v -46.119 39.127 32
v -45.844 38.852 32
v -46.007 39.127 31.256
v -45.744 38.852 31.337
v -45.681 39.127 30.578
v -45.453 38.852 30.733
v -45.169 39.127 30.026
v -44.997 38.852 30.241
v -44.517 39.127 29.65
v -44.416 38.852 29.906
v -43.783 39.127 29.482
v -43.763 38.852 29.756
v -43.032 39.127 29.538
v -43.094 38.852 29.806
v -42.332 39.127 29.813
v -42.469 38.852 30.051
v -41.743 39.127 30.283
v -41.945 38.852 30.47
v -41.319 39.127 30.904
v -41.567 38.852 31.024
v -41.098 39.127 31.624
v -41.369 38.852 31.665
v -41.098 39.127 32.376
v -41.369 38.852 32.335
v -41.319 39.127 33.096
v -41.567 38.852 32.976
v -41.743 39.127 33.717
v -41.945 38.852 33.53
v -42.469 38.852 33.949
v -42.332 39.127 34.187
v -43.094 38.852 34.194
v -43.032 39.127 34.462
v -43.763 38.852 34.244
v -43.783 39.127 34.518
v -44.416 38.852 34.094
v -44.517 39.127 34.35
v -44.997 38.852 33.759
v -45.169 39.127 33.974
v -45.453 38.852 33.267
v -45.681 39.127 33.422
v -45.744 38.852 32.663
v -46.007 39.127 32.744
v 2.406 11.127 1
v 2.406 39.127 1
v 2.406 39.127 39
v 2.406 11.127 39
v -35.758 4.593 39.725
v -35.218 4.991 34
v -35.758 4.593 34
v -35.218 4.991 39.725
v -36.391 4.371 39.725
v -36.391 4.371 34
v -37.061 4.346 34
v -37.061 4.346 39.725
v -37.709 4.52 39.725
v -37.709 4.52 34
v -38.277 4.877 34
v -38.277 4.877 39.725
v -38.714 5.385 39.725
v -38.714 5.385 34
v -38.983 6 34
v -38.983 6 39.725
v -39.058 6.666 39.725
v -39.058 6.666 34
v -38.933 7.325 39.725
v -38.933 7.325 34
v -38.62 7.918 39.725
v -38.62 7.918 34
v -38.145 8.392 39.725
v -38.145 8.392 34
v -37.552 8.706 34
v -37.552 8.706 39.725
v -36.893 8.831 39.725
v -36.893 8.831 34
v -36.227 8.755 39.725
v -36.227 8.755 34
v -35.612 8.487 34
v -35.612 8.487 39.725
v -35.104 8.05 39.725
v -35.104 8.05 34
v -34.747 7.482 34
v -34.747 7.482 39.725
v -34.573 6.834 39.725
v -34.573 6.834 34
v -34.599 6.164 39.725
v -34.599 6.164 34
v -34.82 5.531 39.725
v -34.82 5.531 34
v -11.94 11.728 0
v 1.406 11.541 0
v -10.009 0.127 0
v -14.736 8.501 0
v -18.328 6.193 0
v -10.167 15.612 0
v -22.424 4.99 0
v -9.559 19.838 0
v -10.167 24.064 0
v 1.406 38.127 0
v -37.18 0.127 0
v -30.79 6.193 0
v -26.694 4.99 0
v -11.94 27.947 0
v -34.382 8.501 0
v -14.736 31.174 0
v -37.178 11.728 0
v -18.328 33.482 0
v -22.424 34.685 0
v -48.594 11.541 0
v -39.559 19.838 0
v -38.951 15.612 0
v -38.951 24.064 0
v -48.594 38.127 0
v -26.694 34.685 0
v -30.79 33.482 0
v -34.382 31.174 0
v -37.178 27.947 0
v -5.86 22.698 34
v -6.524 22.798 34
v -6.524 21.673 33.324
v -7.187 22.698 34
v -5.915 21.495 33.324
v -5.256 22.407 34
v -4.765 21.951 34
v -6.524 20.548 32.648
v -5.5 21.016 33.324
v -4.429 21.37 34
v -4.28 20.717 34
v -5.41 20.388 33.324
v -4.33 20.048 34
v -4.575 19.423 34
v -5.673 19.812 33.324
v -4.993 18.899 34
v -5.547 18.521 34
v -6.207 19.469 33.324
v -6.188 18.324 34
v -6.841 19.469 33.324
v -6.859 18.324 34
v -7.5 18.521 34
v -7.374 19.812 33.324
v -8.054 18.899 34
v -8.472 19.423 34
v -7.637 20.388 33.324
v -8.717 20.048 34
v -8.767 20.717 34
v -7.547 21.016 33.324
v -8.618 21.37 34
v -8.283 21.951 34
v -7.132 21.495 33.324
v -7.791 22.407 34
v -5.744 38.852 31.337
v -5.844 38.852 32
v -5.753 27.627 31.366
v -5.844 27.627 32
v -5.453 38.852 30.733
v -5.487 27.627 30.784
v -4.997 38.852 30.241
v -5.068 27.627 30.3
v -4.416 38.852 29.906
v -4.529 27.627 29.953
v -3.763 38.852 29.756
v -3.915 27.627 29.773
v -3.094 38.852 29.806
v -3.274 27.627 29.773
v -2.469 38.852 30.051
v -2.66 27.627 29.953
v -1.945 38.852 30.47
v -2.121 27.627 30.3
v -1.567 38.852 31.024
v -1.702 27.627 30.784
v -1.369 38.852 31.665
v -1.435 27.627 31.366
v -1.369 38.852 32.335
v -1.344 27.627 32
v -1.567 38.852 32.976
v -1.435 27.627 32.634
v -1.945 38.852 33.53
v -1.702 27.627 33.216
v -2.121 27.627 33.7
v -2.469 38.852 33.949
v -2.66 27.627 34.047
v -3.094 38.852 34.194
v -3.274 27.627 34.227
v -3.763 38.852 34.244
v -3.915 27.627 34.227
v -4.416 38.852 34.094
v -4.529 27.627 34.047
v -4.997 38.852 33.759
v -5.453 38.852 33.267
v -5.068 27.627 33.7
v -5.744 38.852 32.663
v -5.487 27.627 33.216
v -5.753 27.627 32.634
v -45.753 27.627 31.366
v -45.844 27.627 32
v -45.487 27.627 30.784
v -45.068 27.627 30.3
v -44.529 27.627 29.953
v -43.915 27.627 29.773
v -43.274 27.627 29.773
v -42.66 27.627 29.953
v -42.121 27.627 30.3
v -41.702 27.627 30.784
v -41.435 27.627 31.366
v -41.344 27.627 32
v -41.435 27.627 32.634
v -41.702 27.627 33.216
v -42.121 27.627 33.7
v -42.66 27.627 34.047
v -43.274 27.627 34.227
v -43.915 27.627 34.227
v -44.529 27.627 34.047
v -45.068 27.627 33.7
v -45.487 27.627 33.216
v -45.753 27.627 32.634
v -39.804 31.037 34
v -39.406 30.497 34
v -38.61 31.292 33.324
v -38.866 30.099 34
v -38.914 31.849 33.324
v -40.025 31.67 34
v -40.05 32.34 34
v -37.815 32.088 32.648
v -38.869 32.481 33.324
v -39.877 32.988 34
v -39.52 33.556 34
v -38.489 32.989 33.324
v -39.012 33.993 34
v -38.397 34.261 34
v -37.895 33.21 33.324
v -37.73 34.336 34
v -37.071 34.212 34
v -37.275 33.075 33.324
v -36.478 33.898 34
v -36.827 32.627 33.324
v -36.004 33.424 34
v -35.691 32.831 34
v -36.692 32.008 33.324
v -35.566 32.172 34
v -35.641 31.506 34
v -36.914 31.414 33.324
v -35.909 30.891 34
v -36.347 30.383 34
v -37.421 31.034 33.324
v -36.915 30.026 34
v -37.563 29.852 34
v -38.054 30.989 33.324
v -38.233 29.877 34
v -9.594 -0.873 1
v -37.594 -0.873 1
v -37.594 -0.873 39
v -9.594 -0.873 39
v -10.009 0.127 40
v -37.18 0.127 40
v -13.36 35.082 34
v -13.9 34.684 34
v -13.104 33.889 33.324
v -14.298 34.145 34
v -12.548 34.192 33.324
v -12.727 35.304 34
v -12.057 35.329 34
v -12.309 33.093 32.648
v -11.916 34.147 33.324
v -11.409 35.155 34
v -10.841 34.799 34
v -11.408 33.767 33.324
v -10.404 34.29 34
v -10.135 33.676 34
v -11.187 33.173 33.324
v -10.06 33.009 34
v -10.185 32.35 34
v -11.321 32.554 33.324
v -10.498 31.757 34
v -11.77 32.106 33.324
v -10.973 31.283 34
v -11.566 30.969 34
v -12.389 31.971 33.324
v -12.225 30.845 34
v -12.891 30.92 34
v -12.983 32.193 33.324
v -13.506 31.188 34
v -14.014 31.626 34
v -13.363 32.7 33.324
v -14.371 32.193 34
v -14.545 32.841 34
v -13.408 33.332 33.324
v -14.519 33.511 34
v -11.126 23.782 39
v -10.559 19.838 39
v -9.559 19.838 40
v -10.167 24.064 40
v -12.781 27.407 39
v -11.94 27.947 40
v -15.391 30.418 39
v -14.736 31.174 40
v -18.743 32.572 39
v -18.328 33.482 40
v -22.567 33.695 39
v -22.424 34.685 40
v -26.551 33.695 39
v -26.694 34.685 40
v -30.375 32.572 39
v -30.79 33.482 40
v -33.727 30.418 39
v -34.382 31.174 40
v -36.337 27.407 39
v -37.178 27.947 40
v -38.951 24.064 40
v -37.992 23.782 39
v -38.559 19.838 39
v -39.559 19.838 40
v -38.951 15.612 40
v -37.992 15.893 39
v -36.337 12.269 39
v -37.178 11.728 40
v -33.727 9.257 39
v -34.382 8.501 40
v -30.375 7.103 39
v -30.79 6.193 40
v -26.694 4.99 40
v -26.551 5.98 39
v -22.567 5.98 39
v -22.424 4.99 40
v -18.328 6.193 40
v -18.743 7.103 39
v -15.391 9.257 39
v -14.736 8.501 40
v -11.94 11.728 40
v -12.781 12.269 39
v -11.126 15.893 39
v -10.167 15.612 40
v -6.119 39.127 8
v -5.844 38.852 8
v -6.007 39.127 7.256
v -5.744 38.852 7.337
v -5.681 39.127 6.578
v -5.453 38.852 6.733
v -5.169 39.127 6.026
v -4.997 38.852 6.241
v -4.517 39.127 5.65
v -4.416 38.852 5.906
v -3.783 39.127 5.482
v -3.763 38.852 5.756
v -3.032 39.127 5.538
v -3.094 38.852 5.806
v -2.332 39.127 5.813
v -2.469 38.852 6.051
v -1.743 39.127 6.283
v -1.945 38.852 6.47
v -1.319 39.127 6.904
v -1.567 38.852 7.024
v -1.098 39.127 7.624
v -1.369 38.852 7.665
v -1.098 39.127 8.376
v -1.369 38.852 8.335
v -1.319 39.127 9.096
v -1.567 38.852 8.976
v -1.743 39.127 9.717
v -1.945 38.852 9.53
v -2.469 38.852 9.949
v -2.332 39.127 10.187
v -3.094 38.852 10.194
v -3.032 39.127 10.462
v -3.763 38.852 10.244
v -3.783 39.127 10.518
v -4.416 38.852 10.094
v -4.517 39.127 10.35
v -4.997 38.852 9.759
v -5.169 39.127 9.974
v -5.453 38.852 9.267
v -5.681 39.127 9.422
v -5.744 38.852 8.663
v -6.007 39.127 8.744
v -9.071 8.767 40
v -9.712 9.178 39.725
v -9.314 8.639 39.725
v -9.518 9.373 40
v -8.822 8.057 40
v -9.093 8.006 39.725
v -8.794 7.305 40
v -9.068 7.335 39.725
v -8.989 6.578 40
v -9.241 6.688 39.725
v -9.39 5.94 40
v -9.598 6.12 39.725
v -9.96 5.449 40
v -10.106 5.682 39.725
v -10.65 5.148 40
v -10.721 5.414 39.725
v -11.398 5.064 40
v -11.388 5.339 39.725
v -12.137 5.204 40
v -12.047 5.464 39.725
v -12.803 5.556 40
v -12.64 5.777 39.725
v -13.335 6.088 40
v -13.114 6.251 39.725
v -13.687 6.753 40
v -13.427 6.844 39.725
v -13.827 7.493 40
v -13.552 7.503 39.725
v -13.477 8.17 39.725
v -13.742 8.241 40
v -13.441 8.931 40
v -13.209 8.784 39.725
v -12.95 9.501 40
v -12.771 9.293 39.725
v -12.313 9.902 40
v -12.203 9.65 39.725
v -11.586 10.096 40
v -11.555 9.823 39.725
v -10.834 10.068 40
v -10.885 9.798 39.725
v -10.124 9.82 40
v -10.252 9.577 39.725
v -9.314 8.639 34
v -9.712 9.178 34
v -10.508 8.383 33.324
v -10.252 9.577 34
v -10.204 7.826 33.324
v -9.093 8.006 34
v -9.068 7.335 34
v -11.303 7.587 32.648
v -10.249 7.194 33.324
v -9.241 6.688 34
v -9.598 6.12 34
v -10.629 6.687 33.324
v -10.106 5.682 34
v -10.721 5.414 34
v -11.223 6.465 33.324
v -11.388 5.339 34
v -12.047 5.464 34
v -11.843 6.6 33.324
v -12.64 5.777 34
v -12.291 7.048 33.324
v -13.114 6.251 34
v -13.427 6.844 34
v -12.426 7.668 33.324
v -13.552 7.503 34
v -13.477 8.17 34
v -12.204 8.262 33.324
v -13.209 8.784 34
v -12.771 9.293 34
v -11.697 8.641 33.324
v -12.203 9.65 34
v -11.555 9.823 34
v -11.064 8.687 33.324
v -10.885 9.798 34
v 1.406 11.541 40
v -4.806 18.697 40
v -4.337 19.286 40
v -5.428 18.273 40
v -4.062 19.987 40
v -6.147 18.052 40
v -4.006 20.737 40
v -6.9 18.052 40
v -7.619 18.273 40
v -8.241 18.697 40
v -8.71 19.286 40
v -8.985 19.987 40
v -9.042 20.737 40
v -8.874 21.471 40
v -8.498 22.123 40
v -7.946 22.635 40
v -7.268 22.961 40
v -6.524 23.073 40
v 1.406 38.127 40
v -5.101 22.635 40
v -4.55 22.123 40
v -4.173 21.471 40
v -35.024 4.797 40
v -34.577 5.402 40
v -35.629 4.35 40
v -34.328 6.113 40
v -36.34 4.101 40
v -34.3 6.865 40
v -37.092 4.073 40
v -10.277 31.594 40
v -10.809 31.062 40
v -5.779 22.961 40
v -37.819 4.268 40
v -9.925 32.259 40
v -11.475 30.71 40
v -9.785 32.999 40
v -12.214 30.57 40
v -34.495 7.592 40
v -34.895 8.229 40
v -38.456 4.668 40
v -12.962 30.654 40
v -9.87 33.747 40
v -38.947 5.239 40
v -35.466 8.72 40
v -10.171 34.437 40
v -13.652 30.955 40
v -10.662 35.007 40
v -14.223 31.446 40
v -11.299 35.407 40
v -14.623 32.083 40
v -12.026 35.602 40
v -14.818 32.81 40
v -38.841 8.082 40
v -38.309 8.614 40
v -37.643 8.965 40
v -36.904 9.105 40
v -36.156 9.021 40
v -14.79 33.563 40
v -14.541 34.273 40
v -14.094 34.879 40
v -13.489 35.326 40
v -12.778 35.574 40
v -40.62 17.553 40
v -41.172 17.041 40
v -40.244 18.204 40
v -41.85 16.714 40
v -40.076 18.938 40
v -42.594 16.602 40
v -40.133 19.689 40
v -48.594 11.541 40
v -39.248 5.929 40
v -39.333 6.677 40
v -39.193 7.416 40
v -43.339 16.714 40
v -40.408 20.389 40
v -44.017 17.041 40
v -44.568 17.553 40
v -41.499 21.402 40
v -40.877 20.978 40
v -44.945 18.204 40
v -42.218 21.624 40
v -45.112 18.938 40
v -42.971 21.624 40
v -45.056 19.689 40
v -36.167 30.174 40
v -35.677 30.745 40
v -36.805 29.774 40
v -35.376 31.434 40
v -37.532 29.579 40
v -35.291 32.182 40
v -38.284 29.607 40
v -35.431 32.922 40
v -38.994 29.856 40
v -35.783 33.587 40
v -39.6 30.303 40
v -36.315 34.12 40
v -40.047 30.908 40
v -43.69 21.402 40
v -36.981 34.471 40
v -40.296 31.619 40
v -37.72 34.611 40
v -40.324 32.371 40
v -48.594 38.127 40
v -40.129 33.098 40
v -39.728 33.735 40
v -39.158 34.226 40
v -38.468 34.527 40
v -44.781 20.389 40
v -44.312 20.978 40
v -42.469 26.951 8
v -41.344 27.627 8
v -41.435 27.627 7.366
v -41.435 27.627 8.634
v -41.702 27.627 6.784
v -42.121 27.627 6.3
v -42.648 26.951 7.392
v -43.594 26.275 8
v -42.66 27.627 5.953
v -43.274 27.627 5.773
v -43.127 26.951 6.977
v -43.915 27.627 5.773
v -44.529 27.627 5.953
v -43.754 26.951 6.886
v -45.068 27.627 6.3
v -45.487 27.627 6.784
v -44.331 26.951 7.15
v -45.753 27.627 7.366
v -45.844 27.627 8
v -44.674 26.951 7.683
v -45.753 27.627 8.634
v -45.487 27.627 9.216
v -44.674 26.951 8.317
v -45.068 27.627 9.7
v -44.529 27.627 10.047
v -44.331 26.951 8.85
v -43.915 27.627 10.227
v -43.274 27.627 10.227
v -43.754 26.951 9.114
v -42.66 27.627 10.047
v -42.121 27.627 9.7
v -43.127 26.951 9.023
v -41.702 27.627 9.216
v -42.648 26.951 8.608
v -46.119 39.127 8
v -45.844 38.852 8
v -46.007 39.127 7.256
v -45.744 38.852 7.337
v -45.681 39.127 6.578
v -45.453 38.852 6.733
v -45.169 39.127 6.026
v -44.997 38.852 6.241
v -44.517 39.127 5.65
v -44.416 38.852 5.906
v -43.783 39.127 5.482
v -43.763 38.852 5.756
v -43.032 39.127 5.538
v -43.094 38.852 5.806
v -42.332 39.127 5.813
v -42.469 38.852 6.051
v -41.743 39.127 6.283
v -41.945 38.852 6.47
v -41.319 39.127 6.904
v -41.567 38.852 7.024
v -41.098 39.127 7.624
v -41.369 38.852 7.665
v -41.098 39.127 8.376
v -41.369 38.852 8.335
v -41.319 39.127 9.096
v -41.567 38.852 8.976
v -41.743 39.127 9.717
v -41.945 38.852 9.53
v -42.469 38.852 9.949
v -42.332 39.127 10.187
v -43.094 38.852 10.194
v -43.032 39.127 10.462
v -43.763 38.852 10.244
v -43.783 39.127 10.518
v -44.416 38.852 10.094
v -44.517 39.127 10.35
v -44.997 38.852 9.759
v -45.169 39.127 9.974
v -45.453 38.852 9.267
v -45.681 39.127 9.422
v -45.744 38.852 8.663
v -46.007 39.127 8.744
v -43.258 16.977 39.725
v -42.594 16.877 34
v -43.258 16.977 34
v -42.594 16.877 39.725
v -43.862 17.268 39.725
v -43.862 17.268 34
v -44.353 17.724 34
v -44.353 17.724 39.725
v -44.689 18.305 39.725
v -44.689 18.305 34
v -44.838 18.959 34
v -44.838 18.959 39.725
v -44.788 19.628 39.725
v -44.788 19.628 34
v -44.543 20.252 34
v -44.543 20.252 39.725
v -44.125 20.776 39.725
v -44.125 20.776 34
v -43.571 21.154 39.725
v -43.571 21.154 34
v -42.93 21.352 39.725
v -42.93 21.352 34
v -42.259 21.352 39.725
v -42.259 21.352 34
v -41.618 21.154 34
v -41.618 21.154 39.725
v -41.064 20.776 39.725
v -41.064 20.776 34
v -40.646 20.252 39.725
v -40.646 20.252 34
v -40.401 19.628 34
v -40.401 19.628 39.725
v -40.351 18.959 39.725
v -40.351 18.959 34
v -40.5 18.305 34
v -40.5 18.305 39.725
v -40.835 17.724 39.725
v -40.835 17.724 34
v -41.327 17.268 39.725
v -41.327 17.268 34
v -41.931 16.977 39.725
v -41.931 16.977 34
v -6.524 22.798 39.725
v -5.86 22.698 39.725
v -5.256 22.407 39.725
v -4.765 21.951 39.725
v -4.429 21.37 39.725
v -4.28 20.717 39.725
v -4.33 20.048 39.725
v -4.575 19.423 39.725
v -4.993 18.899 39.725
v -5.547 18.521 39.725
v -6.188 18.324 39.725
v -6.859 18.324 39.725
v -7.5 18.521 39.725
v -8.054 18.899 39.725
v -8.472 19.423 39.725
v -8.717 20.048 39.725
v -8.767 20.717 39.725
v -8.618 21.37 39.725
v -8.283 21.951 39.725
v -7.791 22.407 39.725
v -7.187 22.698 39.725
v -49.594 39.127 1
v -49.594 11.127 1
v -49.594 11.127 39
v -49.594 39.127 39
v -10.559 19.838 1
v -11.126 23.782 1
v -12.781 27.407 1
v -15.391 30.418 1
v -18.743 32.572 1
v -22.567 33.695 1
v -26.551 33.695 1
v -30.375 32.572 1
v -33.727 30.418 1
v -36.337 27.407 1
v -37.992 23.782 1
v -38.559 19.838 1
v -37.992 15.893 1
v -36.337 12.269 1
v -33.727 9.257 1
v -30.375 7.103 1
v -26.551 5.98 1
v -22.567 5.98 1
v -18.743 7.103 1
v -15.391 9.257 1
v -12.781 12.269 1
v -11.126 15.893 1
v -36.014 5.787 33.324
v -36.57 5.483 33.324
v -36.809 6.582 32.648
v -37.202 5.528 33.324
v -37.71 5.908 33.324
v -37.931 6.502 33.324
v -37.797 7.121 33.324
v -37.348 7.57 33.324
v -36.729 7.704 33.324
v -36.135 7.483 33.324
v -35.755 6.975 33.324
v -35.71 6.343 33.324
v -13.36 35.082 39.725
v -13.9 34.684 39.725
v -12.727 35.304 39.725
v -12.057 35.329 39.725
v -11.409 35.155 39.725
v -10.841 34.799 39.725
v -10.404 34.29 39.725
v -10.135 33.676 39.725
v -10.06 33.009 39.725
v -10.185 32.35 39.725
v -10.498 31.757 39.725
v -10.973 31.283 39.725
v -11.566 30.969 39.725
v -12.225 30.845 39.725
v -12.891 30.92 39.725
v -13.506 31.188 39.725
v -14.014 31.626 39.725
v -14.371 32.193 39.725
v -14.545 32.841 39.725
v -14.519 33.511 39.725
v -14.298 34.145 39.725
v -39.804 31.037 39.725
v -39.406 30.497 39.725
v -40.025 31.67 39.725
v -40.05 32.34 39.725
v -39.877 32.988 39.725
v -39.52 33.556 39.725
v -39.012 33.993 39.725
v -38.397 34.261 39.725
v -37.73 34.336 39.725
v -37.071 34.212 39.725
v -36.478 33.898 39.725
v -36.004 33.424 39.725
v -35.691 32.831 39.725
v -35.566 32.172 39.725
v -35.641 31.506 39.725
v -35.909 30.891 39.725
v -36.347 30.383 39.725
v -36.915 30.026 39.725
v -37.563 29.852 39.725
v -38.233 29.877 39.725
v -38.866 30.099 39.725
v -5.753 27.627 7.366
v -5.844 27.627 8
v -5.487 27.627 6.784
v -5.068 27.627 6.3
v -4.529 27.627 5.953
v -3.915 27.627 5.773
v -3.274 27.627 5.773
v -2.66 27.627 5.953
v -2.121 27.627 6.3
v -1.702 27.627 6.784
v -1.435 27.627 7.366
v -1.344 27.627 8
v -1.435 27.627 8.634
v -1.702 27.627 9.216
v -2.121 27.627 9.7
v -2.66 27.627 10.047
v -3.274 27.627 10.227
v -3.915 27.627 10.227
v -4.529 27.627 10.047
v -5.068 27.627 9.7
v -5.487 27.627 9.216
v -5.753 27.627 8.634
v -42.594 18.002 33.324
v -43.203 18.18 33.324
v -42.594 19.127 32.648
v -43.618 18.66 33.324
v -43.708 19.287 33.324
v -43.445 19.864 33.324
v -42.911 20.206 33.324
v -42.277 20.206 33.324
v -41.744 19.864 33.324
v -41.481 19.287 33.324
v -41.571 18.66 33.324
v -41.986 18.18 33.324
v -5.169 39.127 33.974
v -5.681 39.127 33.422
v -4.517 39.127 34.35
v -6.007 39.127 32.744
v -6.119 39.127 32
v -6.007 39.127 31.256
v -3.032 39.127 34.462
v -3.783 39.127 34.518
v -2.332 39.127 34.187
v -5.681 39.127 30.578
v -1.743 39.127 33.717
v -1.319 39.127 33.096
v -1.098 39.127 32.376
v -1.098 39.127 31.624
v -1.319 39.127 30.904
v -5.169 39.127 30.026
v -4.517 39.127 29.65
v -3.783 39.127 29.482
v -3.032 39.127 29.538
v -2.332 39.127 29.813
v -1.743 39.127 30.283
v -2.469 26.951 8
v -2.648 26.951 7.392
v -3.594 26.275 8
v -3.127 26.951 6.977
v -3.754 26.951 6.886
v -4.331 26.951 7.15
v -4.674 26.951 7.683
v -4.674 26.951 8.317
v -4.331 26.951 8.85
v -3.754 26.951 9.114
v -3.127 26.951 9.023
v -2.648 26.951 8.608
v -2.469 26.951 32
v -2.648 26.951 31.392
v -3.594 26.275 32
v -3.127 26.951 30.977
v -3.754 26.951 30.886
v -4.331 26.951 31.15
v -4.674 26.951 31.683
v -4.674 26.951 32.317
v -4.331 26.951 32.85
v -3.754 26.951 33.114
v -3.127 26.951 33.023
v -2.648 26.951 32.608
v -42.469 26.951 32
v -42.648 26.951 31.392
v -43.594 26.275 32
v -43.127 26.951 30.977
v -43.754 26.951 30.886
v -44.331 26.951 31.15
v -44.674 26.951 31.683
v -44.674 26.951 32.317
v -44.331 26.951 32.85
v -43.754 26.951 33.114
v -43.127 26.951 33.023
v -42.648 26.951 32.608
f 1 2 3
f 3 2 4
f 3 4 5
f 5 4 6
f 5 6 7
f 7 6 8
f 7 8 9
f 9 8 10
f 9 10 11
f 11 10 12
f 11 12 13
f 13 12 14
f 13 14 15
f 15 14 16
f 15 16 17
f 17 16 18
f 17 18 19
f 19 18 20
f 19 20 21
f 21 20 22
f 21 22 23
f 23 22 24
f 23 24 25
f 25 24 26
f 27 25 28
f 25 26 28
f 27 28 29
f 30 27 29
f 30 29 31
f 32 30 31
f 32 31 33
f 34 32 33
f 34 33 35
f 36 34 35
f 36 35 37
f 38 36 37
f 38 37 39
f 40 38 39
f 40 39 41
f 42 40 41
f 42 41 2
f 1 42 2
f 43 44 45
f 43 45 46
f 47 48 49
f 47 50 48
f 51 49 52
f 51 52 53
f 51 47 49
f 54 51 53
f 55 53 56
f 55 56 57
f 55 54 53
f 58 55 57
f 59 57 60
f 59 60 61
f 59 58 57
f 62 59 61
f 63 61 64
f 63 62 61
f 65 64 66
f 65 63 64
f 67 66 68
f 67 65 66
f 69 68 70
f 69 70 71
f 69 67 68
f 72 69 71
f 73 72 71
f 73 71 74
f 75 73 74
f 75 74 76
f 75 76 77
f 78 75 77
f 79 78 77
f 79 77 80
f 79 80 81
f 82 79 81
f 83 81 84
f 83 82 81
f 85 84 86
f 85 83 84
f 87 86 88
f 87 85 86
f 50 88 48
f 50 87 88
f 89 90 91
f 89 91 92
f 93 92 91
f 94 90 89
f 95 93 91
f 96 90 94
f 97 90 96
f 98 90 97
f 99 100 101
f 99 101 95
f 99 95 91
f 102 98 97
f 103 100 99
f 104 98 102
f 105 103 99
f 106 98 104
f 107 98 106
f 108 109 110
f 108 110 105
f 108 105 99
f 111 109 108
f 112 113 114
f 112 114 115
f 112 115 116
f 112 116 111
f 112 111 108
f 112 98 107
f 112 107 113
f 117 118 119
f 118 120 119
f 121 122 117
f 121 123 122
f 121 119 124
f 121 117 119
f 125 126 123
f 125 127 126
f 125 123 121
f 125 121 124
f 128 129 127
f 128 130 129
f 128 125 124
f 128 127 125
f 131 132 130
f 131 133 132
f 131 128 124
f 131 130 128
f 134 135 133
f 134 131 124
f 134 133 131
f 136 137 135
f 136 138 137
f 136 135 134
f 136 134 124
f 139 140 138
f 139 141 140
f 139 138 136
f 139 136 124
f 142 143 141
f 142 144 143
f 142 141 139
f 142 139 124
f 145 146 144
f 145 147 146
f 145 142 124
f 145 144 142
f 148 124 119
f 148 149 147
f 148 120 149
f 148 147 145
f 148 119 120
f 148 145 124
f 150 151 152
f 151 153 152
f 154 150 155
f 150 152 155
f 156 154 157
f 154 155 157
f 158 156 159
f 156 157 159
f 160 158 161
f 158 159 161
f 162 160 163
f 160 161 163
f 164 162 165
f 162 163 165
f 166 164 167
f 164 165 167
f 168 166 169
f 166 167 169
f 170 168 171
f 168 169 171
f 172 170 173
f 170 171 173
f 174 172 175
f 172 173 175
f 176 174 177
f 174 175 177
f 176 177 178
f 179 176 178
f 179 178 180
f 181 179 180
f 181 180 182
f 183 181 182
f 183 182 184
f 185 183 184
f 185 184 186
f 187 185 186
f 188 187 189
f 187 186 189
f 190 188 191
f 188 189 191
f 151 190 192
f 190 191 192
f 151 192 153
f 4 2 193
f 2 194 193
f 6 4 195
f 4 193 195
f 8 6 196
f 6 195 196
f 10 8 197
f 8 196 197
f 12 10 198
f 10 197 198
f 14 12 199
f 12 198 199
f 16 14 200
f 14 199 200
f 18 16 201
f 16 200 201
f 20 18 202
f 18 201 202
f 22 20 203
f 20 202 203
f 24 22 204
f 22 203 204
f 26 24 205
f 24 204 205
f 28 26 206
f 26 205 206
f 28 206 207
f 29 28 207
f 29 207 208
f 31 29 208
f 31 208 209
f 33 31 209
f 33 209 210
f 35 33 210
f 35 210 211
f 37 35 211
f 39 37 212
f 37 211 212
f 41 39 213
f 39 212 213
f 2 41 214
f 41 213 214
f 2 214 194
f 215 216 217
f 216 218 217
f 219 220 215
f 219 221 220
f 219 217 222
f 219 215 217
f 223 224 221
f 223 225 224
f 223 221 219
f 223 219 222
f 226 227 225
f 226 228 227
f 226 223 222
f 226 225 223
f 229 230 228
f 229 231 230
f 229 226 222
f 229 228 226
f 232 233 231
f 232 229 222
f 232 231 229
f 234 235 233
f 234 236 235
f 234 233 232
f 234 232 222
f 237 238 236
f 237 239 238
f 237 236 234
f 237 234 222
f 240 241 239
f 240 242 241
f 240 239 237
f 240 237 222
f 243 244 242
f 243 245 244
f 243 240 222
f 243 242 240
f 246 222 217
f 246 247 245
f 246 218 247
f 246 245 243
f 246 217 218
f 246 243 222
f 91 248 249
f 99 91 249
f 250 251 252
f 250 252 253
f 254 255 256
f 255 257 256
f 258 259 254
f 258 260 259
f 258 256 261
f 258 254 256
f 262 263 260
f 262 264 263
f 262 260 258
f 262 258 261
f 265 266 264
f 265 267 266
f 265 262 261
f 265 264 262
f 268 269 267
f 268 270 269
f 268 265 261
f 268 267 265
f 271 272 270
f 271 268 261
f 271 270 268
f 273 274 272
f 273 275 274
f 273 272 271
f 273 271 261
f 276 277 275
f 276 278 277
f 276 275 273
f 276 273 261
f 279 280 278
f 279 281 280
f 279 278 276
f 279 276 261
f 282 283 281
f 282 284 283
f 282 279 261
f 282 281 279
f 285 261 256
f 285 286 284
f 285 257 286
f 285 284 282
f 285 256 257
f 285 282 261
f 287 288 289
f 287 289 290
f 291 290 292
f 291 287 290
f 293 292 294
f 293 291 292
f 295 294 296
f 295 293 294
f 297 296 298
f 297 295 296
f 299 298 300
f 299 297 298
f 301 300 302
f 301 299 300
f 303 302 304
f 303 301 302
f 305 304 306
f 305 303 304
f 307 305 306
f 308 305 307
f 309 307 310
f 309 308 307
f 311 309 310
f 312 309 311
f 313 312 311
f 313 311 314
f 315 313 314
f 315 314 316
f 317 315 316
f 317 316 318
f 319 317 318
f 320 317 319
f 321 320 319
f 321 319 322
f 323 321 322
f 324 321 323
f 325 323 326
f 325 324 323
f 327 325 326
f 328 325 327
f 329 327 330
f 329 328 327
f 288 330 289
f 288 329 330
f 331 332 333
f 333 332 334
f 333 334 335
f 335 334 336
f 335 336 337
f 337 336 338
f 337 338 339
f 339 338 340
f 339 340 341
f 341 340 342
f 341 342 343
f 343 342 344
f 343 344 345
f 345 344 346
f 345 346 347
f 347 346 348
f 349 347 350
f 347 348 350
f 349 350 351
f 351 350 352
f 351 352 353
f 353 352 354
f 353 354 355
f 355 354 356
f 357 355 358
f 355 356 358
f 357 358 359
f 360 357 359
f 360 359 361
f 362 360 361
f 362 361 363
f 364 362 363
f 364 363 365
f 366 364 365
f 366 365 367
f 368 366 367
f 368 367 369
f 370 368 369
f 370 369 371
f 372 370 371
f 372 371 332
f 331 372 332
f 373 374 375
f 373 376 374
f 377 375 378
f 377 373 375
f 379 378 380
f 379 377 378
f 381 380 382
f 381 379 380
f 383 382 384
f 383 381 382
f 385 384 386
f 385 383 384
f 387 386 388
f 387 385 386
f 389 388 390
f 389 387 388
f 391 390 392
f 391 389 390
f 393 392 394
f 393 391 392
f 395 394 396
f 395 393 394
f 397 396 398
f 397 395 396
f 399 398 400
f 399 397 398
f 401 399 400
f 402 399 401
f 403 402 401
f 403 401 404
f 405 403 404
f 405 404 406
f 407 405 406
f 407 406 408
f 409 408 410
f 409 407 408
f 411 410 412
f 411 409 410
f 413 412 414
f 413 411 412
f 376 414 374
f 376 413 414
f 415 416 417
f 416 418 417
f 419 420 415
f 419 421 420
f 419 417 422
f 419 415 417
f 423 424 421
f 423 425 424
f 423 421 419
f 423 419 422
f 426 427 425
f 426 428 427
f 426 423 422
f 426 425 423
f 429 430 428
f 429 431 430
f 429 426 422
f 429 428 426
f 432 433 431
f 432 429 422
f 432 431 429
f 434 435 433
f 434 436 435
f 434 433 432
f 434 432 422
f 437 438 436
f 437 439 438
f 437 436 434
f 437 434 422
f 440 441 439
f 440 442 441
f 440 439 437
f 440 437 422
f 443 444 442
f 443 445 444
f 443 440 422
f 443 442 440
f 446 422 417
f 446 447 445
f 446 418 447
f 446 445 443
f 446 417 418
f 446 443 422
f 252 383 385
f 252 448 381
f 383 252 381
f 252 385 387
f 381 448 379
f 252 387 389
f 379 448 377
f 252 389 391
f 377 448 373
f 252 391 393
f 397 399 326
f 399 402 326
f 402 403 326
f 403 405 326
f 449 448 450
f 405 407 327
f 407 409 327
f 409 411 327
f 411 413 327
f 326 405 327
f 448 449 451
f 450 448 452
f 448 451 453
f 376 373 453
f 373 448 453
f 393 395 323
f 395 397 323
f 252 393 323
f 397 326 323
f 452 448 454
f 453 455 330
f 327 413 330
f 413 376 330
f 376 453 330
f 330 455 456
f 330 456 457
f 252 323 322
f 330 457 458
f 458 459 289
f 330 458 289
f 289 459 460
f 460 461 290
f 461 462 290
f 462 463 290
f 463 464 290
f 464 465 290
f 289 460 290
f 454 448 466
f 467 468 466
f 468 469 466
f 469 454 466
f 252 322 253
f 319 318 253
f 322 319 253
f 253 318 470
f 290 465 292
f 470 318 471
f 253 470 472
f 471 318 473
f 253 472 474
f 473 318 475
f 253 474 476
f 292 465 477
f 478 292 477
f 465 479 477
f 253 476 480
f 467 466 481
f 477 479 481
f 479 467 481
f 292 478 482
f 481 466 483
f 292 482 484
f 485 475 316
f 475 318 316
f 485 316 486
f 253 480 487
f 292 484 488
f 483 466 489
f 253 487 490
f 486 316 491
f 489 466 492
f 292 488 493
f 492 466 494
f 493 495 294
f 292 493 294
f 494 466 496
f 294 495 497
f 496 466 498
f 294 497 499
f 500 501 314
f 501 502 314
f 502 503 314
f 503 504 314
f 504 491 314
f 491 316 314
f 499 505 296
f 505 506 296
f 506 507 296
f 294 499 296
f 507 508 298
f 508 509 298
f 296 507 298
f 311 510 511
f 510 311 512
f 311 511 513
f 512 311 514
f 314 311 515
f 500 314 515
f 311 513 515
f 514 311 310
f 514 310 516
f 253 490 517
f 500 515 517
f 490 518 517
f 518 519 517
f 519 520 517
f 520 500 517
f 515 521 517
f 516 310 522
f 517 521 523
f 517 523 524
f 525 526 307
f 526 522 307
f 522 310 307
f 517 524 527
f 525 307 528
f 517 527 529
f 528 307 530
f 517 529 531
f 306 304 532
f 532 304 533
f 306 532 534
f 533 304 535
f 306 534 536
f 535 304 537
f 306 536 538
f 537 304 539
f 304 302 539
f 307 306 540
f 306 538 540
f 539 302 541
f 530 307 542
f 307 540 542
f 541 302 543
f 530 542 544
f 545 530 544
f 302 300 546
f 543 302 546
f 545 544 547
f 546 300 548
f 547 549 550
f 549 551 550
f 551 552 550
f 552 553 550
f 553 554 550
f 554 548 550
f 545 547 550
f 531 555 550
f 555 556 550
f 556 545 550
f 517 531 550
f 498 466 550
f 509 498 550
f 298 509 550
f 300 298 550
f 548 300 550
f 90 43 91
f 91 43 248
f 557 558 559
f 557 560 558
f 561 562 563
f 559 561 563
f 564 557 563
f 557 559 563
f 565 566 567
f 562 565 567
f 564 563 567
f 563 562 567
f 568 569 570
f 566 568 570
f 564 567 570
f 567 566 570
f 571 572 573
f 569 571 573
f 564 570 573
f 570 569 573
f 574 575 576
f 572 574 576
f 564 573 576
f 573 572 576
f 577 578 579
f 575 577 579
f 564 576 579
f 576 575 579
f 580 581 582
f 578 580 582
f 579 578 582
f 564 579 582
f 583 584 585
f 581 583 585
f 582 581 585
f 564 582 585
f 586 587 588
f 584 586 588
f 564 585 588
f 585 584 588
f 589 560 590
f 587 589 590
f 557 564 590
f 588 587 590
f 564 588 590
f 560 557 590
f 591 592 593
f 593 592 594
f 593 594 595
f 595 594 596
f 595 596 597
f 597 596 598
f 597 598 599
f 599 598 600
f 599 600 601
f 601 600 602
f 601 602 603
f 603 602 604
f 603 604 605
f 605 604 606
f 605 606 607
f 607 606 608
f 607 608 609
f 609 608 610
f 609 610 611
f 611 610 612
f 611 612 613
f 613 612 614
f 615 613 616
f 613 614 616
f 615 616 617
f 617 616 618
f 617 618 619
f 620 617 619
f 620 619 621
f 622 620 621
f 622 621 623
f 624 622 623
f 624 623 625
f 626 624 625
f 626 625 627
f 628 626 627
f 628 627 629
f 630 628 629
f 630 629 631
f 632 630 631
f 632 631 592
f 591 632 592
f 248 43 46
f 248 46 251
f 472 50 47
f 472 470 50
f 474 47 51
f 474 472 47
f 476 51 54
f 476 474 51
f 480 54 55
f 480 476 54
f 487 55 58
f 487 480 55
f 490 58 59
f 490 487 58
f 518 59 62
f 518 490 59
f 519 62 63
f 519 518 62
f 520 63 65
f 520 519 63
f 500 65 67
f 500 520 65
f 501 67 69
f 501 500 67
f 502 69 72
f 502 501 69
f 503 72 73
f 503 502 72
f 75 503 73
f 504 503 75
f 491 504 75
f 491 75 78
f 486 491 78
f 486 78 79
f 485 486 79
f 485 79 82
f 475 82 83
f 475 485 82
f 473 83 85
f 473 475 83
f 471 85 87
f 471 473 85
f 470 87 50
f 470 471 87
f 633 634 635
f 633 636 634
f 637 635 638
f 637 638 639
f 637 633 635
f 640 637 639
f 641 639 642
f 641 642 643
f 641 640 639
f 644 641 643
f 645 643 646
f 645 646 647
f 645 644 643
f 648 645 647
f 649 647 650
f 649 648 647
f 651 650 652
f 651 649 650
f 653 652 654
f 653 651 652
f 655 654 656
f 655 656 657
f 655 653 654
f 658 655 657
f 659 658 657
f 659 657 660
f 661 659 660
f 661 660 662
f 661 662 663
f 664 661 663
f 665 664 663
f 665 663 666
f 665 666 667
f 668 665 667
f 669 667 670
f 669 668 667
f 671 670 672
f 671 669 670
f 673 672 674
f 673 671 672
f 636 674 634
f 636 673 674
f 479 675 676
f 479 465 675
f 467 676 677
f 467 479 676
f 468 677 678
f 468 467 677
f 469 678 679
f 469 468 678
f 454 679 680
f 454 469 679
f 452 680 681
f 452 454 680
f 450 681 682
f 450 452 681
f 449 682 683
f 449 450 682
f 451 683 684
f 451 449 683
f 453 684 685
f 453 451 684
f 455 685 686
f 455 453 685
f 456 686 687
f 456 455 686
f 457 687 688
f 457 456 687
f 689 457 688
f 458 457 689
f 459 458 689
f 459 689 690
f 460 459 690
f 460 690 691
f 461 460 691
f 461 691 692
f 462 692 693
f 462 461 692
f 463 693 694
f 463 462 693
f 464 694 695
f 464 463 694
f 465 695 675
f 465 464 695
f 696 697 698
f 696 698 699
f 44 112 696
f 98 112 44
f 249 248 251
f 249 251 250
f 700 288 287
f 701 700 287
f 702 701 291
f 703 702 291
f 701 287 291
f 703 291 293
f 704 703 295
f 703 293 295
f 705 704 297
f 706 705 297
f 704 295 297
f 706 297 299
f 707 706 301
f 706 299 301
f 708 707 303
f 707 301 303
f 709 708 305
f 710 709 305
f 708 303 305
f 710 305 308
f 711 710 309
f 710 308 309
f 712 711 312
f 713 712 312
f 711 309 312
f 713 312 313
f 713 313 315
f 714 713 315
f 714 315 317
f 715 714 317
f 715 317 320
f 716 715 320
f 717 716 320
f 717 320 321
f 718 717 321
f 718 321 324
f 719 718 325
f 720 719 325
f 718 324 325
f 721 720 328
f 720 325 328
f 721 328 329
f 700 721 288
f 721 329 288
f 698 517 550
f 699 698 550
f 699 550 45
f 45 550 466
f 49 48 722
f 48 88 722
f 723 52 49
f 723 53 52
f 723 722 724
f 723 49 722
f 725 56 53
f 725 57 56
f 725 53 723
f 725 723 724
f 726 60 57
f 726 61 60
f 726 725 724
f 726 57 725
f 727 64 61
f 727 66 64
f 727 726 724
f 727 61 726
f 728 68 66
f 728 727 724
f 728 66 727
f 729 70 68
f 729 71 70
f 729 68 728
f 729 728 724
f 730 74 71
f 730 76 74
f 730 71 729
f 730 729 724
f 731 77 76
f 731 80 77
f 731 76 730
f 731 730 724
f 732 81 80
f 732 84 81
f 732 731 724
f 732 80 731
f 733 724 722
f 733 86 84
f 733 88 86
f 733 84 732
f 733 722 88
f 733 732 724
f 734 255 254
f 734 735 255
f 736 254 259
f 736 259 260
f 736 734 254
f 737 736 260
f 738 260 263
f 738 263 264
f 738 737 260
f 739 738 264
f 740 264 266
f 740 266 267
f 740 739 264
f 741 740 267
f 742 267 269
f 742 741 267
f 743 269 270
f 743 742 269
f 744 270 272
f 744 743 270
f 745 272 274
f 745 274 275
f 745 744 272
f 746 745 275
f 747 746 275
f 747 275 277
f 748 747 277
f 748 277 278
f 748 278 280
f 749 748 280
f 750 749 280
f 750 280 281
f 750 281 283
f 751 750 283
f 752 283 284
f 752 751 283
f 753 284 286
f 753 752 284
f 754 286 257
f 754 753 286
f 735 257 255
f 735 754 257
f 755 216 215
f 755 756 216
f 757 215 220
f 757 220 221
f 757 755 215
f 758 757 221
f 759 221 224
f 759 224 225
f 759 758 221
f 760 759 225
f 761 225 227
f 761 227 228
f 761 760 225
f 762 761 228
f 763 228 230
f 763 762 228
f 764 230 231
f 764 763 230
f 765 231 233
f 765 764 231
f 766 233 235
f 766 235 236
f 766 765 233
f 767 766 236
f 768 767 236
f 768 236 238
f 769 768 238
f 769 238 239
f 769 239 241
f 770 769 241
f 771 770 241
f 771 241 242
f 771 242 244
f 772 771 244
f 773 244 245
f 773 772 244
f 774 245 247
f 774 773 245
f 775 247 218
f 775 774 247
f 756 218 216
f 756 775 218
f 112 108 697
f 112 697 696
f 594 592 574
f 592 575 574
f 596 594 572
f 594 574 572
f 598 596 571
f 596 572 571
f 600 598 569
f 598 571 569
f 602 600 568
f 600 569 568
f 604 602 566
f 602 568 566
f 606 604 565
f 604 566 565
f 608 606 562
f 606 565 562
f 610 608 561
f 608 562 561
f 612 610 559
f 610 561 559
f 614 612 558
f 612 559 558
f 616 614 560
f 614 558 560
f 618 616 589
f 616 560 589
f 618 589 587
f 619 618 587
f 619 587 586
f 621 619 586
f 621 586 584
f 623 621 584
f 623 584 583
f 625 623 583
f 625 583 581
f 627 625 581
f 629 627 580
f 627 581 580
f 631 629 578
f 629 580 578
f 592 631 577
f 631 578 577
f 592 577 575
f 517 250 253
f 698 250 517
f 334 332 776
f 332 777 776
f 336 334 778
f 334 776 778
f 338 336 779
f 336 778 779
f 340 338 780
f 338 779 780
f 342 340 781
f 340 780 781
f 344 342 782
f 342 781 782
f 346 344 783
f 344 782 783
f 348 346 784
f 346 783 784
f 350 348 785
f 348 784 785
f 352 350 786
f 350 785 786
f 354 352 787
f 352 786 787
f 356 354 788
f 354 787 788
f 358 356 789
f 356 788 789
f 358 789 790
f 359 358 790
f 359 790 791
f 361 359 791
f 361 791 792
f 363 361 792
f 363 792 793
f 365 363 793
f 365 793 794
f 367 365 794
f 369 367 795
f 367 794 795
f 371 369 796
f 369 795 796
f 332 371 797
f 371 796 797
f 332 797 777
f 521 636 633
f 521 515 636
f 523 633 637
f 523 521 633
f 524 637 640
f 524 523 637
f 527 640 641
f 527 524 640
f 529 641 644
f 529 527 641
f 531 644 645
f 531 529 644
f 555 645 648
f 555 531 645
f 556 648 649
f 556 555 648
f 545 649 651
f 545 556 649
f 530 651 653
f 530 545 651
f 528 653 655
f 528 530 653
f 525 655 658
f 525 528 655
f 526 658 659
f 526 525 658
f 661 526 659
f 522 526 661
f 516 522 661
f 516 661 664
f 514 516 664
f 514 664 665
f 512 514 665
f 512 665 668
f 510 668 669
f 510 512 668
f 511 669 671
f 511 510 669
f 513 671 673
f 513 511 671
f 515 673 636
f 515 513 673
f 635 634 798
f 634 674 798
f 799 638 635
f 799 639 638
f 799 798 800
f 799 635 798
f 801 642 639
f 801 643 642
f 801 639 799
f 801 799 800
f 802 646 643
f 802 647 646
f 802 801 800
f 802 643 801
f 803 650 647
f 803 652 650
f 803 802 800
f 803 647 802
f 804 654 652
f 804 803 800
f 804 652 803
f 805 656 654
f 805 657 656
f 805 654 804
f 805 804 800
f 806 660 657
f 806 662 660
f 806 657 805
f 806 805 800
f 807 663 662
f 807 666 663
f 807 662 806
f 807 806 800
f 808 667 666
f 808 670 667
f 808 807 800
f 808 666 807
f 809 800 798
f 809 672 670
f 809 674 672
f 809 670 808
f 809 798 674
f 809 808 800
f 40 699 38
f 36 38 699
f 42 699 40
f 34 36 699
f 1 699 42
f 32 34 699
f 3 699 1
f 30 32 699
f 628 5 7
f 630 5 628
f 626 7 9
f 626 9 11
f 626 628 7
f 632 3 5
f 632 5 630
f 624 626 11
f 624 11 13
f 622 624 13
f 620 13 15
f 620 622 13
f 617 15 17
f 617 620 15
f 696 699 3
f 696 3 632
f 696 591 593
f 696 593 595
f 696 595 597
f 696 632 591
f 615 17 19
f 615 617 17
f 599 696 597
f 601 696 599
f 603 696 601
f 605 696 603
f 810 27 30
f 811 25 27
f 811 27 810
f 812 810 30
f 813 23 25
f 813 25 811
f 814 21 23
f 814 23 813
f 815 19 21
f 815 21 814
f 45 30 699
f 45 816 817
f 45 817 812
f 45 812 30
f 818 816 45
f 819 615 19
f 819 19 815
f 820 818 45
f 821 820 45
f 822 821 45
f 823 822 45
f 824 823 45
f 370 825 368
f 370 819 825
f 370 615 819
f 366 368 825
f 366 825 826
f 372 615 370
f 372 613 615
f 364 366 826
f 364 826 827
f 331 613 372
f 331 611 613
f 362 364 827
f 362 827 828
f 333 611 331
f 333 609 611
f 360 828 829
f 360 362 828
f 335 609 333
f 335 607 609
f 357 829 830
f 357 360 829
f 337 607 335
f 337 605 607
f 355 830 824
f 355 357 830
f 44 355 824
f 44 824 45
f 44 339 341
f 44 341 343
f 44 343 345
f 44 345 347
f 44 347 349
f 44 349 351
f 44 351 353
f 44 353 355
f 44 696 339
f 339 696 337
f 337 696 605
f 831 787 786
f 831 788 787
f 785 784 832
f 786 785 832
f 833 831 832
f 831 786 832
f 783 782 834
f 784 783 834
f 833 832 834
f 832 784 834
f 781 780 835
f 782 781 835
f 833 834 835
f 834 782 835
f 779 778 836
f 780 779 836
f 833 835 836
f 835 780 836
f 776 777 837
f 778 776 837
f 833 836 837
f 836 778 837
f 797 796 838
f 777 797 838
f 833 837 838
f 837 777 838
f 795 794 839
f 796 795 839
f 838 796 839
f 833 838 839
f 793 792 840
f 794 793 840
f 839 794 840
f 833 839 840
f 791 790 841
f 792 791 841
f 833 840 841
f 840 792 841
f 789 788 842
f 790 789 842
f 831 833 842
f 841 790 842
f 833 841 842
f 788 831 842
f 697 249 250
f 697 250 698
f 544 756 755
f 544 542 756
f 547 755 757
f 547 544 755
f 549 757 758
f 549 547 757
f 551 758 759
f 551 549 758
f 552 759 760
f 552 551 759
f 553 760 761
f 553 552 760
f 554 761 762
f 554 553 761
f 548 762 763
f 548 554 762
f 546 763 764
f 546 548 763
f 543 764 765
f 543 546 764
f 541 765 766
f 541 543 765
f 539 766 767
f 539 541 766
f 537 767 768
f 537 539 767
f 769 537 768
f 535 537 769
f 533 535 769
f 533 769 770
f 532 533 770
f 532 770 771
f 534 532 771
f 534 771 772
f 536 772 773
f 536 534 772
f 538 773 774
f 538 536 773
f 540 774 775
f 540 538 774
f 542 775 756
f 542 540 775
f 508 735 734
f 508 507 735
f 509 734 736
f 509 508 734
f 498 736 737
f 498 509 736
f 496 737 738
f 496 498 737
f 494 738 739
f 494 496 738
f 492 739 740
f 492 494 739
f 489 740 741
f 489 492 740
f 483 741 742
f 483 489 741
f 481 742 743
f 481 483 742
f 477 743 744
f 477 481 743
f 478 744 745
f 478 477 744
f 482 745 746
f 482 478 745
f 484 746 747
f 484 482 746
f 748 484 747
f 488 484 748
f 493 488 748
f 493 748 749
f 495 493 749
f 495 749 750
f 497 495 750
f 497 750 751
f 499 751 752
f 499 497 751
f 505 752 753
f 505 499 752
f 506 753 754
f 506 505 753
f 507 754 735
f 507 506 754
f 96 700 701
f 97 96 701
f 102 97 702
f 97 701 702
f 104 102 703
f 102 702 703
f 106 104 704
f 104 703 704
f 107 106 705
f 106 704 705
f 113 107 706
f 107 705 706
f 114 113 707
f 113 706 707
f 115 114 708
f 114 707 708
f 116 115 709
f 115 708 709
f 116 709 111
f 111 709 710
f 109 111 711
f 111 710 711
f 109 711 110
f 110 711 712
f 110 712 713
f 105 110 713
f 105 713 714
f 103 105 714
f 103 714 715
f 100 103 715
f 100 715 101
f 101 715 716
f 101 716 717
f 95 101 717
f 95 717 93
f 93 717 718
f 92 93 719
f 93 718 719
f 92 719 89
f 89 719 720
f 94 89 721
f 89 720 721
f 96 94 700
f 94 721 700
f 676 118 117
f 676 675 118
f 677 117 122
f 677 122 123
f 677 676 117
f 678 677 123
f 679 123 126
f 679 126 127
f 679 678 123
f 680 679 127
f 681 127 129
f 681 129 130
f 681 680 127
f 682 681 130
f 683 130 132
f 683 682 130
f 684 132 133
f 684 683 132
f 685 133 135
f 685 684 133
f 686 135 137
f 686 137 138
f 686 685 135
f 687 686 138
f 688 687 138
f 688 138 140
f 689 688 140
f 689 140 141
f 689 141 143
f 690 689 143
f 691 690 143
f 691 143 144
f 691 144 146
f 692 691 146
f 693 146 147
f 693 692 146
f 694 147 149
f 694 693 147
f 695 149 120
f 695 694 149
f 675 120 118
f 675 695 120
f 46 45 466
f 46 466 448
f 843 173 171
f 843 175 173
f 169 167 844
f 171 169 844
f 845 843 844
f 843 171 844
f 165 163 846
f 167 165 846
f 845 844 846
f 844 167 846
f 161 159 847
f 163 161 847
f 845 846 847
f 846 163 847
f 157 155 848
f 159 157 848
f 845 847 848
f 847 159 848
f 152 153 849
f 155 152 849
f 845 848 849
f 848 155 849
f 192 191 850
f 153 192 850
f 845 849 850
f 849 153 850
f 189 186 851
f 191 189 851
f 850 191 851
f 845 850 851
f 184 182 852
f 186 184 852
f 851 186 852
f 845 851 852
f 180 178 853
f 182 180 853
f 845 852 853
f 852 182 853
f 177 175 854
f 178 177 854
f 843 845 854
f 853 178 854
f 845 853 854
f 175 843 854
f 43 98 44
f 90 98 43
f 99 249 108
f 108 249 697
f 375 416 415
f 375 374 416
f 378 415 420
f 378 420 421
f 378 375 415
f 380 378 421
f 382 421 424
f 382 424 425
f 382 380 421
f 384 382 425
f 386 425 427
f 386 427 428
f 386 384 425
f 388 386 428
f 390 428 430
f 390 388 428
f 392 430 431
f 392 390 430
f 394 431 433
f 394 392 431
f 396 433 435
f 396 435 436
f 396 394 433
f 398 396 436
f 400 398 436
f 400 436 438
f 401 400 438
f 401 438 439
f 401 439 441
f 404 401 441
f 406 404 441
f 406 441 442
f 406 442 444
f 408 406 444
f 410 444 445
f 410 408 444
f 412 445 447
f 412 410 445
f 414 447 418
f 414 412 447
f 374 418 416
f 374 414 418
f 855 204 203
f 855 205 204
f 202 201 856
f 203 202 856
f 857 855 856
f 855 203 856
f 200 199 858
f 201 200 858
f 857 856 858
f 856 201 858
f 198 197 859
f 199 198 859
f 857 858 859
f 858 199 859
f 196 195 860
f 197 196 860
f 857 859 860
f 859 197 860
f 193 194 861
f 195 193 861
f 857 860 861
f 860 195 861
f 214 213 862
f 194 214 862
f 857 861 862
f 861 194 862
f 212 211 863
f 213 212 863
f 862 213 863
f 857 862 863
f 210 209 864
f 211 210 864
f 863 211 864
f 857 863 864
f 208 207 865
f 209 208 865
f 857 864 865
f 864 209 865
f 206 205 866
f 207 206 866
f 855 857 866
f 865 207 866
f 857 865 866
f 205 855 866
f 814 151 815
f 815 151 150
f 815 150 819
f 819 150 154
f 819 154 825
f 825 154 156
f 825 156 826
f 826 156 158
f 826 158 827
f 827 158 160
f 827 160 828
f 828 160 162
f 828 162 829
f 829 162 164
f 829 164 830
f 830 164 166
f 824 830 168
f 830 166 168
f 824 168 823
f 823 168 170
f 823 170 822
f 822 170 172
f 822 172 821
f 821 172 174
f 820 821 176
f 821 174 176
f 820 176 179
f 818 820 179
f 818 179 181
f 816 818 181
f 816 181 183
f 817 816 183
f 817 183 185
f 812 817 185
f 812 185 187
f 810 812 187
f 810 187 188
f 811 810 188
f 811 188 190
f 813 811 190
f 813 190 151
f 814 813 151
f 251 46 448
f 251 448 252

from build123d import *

# Parameters (mm, degrees)
BOSS_EXTRUDE1_DEPTH             = 40
SKETCH2_R                       = 14
CUT_EXTRUDE1_DEPTH              = 40
M5X0_5_TAPPED_HOLE4_D           = 4.5
M5X0_5_TAPPED_HOLE4_DEPTH       = 11.5
M5X0_5_TAPPED_HOLE4_CSINK_D     = 5.05
M5X0_5_TAPPED_HOLE4_CSINK_ANGLE = 90
M5X0_5_TAPPED_HOLE4_TIP         = 1.351936393
CIRPATTERN1_COUNT               = 8
CHAMFER1_SIZE                   = 1
CHAMFER2_SIZE                   = 1


with BuildPart() as part:
    # Sketch1 → Boss-Extrude1 (new body)
    with BuildSketch(Plane.XY):
        Polygon((-49.594358144, 39.126859892), (2.405641856, 39.126859892), (2.405641856, 11.126859892), (-9.594358144, -0.873140108), (-37.594358144, -0.873140108), (-49.594358144, 11.126859892), align=None)
    extrude(amount=BOSS_EXTRUDE1_DEPTH)

    # Sketch2 → Cut-Extrude1 (cut)
    with BuildSketch(Plane.XY.offset(40)):
        with Locations((-24.558993323, 19.837643708)):
            Circle(SKETCH2_R)
    extrude(amount=-CUT_EXTRUDE1_DEPTH, mode=Mode.SUBTRACT)

    # M5x0.5 Tapped Hole4
    with Locations(Plane(origin=(0, 39.126859892, 0), x_dir=(1, 0, 0), z_dir=(0, 1, 0))):
        with Locations((-43.594358144, -32), (-3.594358144, -32), (-3.594358144, -8), (-43.594358144, -8)):
            CounterSinkHole(M5X0_5_TAPPED_HOLE4_D / 2, M5X0_5_TAPPED_HOLE4_CSINK_D / 2, depth=M5X0_5_TAPPED_HOLE4_DEPTH, counter_sink_angle=M5X0_5_TAPPED_HOLE4_CSINK_ANGLE)
            with Locations((0, 0, -(M5X0_5_TAPPED_HOLE4_DEPTH + M5X0_5_TAPPED_HOLE4_TIP / 2))):  # 118° drill point
                Cone(0, M5X0_5_TAPPED_HOLE4_D / 2, M5X0_5_TAPPED_HOLE4_TIP, mode=Mode.SUBTRACT)

    # Sketch15 → M5x0.5 Tapped Hole5 (revolve, cut)
    with BuildSketch(Plane(origin=(-42.594358144, 19.126859892, 40), x_dir=(0, -1, 0), z_dir=(1, 0, 0))):
        Polygon((0, 0), (0, 7.351936393), (2.25, 6), (2.25, 0.275), (2.525, 0), align=None)
    m5x0_5_tapped_hole5 = revolve(axis=Axis((-42.594358144, 19.126859892, 46.35), (0, 0, -1)), mode=Mode.SUBTRACT)

    # CirPattern1: M5x0.5 Tapped Hole5 ×8 about axis, 2 skipped
    cirpattern1_axis = Axis((-24.558993323, 19.837643708, 0), (0, 0, 1))
    add([m5x0_5_tapped_hole5.rotate(cirpattern1_axis, i * 360 / CIRPATTERN1_COUNT) for i in range(1, CIRPATTERN1_COUNT) if i not in (2, 6)], mode=Mode.SUBTRACT)

    # Chamfer1
    chamfer1_edges = [part.edges().sort_by_distance(p)[0] for p in [
        (-23.594358144, -0.873140108, 40),
        (-3.594358144, 5.126859892, 40),
        (2.405641856, 25.126859892, 40),
        (-23.594358144, 39.126859892, 40),
        (-49.594358144, 25.126859892, 40),
        (-23.594358144, 39.126859892, 0),
        (2.405641856, 25.126859892, 0),
        (-3.594358144, 5.126859892, 0),
        (-23.594358144, -0.873140108, 0),
        (-43.594358144, 5.126859892, 0),
        (-49.594358144, 25.126859892, 0),
        (-43.594358144, 5.126859892, 40),
    ]]
    chamfer(chamfer1_edges, length=CHAMFER1_SIZE)

    # Chamfer2
    chamfer2_edges = [part.edges().sort_by_distance(p)[0] for p in [
        (-38.558993323, 19.837643708, 0),
        (-38.558993323, 19.837643708, 40),
    ]]
    chamfer(chamfer2_edges, length=CHAMFER2_SIZE)


solid = part.part
